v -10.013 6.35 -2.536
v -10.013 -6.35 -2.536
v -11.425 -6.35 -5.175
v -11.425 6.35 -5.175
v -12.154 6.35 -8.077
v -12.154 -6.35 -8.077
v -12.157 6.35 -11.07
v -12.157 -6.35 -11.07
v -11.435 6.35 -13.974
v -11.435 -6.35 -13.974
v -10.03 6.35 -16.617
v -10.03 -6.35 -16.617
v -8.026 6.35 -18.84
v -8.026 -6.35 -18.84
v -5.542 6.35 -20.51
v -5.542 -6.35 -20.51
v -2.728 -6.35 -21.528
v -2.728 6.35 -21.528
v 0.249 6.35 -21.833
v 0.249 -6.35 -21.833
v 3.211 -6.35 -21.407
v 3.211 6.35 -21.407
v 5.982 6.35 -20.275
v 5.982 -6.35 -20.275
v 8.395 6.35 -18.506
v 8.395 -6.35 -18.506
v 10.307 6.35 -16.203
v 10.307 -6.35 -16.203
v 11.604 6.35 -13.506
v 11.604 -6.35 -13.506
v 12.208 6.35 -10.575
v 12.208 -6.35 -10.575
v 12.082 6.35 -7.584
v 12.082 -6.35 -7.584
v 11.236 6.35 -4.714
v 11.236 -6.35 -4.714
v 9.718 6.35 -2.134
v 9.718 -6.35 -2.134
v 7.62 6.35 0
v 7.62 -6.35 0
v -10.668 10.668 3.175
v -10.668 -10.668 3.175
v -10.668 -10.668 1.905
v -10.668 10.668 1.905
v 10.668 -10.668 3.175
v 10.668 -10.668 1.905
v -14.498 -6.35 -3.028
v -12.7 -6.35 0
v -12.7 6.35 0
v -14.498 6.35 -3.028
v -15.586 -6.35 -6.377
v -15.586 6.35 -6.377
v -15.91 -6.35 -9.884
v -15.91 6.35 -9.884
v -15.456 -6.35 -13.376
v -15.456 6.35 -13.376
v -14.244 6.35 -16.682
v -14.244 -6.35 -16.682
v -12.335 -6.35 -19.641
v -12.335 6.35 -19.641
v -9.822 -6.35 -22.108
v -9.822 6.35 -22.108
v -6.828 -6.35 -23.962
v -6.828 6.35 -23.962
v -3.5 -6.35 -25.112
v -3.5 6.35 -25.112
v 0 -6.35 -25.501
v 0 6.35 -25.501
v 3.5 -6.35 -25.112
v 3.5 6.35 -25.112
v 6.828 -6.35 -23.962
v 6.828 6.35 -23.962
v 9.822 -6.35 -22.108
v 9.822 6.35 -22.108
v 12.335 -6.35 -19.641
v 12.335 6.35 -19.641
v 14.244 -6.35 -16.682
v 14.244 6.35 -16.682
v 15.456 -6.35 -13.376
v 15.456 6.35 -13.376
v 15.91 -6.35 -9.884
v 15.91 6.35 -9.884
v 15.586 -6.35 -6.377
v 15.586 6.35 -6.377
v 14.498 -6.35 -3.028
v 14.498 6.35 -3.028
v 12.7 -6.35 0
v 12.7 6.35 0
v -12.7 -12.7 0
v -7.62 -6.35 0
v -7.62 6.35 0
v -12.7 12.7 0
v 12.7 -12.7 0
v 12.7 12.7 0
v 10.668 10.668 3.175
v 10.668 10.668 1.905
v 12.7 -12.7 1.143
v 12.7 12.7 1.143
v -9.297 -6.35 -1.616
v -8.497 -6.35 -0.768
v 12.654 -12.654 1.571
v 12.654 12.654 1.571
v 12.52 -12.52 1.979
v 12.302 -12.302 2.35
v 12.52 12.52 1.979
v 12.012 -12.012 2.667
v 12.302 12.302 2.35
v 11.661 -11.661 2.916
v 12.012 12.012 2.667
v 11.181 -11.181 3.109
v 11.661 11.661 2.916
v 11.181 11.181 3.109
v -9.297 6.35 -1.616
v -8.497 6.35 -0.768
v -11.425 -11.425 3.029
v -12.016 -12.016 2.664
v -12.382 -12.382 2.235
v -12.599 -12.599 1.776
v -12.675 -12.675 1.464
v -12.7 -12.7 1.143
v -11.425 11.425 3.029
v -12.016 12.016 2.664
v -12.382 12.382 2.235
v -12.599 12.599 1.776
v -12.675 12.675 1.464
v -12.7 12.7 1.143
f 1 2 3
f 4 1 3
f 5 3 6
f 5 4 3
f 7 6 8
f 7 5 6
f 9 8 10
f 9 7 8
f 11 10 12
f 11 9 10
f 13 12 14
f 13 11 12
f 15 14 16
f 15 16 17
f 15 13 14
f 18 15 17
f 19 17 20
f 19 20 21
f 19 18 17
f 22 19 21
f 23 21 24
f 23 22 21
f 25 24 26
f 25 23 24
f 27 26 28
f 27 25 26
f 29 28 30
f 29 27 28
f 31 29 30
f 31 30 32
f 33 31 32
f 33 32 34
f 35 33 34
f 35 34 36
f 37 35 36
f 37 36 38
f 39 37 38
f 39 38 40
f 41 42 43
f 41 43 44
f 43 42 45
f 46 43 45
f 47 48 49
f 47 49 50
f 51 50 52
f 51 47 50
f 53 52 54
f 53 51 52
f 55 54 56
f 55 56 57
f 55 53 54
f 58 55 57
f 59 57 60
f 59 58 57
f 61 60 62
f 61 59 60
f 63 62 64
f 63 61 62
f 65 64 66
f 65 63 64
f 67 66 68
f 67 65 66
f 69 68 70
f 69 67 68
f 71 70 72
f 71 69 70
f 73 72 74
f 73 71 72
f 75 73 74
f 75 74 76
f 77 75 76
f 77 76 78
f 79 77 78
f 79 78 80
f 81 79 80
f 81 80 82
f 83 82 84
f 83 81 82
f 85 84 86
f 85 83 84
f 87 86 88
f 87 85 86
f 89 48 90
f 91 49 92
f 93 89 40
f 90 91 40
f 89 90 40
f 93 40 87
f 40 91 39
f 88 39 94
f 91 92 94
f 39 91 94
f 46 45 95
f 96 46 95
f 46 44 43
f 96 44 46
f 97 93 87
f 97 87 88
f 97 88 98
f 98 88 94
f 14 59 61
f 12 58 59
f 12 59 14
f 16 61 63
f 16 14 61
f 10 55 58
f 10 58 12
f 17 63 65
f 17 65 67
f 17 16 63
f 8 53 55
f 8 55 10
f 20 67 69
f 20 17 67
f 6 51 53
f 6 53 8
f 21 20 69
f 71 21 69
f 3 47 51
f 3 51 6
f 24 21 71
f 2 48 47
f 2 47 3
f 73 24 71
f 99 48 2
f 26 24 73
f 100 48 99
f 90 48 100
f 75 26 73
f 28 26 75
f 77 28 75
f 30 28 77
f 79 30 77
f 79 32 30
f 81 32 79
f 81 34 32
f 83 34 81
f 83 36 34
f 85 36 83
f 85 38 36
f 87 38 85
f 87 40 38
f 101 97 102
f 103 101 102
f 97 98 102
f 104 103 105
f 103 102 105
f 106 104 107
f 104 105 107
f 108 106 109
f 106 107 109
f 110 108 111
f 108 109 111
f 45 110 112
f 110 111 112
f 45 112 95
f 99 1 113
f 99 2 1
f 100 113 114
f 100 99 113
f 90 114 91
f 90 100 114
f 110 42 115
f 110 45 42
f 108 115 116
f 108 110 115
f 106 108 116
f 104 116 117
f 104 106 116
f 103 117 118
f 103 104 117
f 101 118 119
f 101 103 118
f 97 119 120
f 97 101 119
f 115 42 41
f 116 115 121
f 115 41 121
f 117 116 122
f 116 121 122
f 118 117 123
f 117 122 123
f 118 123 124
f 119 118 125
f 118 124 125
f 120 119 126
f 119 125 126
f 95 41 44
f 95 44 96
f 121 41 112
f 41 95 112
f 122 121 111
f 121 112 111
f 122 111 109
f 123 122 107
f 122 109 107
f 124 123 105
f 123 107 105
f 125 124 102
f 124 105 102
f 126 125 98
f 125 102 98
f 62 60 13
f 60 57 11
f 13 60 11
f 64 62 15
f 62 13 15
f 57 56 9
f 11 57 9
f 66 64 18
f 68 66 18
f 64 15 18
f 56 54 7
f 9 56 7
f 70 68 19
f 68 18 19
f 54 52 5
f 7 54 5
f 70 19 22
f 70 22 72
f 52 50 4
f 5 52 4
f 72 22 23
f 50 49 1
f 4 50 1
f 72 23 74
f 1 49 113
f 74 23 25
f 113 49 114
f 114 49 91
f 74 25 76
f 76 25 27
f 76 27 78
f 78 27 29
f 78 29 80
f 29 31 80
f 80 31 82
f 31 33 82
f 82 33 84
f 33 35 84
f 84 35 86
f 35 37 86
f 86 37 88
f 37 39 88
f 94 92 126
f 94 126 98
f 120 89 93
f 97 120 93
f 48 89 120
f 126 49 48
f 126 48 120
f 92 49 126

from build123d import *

# Parameters (mm, degrees)
F0_W     = 25.4
F0_H     = 25.4
F1_DEPTH = 3.175
F3_W     = 5.08
F3_H     = 12.7
F7_DEPTH = 6.35
F8_R     = 2.032
F9_DEPTH = 1.27


with BuildPart() as f1:
    # F0 (on Top) → F1 (new body)
    with BuildSketch(Plane.XY):
        Rectangle(F0_W, F0_H)
    extrude(amount=F1_DEPTH)



with BuildPart() as f4:
    # F4: sweep along a path in F2
    with BuildLine(Plane.XZ) as f4_path:
        ThreePointArc((-10.16, 0), (0, -23.5582897328), (10.16, 0))
    # F3 (on face) → F4 (sweep)
    with BuildSketch(Plane(origin=(0, 0, 0), x_dir=(1, 0, 0), z_dir=(0, 0, -1))):
        with Locations((10.16, 0)):
            Rectangle(F3_W, F3_H)
    sweep(path=f4_path.line)


with BuildPart() as f1_1:
    add(f1.part)

    add(f4.part)  # F7 merges F4
    # F6 (on Front) → F7 (join, symmetric)
    with BuildSketch(Plane.XZ):
        with BuildLine():
            ThreePointArc((-10.0130578512, -2.535746045), (-8.9072265211, -1.1822790439), (-7.62, 0))
            Line((-7.62, 0), (-10.16, 0))
            Line((-10.16, 0), (-10.0130578512, -2.535746045))
        make_face()
    extrude(amount=F7_DEPTH, both=True)

    # F8
    f8_edges = [f1_1.edges().sort_by_distance(p)[0] for p in [
        (-12.7, 0, 3.175),
        (12.7, 0, 3.175),
        (0, -12.7, 3.175),
        (0, 12.7, 3.175),
    ]]
    fillet(f8_edges, radius=F8_R)

    # F9 (cut): a face of the model
    f9_faces = [f1_1.faces().sort_by_distance(p)[0] for p in [
        (0, 0, 3.175),
    ]]
    extrude(f9_faces, amount=-F9_DEPTH, mode=Mode.SUBTRACT)


solid = f1_1.part
